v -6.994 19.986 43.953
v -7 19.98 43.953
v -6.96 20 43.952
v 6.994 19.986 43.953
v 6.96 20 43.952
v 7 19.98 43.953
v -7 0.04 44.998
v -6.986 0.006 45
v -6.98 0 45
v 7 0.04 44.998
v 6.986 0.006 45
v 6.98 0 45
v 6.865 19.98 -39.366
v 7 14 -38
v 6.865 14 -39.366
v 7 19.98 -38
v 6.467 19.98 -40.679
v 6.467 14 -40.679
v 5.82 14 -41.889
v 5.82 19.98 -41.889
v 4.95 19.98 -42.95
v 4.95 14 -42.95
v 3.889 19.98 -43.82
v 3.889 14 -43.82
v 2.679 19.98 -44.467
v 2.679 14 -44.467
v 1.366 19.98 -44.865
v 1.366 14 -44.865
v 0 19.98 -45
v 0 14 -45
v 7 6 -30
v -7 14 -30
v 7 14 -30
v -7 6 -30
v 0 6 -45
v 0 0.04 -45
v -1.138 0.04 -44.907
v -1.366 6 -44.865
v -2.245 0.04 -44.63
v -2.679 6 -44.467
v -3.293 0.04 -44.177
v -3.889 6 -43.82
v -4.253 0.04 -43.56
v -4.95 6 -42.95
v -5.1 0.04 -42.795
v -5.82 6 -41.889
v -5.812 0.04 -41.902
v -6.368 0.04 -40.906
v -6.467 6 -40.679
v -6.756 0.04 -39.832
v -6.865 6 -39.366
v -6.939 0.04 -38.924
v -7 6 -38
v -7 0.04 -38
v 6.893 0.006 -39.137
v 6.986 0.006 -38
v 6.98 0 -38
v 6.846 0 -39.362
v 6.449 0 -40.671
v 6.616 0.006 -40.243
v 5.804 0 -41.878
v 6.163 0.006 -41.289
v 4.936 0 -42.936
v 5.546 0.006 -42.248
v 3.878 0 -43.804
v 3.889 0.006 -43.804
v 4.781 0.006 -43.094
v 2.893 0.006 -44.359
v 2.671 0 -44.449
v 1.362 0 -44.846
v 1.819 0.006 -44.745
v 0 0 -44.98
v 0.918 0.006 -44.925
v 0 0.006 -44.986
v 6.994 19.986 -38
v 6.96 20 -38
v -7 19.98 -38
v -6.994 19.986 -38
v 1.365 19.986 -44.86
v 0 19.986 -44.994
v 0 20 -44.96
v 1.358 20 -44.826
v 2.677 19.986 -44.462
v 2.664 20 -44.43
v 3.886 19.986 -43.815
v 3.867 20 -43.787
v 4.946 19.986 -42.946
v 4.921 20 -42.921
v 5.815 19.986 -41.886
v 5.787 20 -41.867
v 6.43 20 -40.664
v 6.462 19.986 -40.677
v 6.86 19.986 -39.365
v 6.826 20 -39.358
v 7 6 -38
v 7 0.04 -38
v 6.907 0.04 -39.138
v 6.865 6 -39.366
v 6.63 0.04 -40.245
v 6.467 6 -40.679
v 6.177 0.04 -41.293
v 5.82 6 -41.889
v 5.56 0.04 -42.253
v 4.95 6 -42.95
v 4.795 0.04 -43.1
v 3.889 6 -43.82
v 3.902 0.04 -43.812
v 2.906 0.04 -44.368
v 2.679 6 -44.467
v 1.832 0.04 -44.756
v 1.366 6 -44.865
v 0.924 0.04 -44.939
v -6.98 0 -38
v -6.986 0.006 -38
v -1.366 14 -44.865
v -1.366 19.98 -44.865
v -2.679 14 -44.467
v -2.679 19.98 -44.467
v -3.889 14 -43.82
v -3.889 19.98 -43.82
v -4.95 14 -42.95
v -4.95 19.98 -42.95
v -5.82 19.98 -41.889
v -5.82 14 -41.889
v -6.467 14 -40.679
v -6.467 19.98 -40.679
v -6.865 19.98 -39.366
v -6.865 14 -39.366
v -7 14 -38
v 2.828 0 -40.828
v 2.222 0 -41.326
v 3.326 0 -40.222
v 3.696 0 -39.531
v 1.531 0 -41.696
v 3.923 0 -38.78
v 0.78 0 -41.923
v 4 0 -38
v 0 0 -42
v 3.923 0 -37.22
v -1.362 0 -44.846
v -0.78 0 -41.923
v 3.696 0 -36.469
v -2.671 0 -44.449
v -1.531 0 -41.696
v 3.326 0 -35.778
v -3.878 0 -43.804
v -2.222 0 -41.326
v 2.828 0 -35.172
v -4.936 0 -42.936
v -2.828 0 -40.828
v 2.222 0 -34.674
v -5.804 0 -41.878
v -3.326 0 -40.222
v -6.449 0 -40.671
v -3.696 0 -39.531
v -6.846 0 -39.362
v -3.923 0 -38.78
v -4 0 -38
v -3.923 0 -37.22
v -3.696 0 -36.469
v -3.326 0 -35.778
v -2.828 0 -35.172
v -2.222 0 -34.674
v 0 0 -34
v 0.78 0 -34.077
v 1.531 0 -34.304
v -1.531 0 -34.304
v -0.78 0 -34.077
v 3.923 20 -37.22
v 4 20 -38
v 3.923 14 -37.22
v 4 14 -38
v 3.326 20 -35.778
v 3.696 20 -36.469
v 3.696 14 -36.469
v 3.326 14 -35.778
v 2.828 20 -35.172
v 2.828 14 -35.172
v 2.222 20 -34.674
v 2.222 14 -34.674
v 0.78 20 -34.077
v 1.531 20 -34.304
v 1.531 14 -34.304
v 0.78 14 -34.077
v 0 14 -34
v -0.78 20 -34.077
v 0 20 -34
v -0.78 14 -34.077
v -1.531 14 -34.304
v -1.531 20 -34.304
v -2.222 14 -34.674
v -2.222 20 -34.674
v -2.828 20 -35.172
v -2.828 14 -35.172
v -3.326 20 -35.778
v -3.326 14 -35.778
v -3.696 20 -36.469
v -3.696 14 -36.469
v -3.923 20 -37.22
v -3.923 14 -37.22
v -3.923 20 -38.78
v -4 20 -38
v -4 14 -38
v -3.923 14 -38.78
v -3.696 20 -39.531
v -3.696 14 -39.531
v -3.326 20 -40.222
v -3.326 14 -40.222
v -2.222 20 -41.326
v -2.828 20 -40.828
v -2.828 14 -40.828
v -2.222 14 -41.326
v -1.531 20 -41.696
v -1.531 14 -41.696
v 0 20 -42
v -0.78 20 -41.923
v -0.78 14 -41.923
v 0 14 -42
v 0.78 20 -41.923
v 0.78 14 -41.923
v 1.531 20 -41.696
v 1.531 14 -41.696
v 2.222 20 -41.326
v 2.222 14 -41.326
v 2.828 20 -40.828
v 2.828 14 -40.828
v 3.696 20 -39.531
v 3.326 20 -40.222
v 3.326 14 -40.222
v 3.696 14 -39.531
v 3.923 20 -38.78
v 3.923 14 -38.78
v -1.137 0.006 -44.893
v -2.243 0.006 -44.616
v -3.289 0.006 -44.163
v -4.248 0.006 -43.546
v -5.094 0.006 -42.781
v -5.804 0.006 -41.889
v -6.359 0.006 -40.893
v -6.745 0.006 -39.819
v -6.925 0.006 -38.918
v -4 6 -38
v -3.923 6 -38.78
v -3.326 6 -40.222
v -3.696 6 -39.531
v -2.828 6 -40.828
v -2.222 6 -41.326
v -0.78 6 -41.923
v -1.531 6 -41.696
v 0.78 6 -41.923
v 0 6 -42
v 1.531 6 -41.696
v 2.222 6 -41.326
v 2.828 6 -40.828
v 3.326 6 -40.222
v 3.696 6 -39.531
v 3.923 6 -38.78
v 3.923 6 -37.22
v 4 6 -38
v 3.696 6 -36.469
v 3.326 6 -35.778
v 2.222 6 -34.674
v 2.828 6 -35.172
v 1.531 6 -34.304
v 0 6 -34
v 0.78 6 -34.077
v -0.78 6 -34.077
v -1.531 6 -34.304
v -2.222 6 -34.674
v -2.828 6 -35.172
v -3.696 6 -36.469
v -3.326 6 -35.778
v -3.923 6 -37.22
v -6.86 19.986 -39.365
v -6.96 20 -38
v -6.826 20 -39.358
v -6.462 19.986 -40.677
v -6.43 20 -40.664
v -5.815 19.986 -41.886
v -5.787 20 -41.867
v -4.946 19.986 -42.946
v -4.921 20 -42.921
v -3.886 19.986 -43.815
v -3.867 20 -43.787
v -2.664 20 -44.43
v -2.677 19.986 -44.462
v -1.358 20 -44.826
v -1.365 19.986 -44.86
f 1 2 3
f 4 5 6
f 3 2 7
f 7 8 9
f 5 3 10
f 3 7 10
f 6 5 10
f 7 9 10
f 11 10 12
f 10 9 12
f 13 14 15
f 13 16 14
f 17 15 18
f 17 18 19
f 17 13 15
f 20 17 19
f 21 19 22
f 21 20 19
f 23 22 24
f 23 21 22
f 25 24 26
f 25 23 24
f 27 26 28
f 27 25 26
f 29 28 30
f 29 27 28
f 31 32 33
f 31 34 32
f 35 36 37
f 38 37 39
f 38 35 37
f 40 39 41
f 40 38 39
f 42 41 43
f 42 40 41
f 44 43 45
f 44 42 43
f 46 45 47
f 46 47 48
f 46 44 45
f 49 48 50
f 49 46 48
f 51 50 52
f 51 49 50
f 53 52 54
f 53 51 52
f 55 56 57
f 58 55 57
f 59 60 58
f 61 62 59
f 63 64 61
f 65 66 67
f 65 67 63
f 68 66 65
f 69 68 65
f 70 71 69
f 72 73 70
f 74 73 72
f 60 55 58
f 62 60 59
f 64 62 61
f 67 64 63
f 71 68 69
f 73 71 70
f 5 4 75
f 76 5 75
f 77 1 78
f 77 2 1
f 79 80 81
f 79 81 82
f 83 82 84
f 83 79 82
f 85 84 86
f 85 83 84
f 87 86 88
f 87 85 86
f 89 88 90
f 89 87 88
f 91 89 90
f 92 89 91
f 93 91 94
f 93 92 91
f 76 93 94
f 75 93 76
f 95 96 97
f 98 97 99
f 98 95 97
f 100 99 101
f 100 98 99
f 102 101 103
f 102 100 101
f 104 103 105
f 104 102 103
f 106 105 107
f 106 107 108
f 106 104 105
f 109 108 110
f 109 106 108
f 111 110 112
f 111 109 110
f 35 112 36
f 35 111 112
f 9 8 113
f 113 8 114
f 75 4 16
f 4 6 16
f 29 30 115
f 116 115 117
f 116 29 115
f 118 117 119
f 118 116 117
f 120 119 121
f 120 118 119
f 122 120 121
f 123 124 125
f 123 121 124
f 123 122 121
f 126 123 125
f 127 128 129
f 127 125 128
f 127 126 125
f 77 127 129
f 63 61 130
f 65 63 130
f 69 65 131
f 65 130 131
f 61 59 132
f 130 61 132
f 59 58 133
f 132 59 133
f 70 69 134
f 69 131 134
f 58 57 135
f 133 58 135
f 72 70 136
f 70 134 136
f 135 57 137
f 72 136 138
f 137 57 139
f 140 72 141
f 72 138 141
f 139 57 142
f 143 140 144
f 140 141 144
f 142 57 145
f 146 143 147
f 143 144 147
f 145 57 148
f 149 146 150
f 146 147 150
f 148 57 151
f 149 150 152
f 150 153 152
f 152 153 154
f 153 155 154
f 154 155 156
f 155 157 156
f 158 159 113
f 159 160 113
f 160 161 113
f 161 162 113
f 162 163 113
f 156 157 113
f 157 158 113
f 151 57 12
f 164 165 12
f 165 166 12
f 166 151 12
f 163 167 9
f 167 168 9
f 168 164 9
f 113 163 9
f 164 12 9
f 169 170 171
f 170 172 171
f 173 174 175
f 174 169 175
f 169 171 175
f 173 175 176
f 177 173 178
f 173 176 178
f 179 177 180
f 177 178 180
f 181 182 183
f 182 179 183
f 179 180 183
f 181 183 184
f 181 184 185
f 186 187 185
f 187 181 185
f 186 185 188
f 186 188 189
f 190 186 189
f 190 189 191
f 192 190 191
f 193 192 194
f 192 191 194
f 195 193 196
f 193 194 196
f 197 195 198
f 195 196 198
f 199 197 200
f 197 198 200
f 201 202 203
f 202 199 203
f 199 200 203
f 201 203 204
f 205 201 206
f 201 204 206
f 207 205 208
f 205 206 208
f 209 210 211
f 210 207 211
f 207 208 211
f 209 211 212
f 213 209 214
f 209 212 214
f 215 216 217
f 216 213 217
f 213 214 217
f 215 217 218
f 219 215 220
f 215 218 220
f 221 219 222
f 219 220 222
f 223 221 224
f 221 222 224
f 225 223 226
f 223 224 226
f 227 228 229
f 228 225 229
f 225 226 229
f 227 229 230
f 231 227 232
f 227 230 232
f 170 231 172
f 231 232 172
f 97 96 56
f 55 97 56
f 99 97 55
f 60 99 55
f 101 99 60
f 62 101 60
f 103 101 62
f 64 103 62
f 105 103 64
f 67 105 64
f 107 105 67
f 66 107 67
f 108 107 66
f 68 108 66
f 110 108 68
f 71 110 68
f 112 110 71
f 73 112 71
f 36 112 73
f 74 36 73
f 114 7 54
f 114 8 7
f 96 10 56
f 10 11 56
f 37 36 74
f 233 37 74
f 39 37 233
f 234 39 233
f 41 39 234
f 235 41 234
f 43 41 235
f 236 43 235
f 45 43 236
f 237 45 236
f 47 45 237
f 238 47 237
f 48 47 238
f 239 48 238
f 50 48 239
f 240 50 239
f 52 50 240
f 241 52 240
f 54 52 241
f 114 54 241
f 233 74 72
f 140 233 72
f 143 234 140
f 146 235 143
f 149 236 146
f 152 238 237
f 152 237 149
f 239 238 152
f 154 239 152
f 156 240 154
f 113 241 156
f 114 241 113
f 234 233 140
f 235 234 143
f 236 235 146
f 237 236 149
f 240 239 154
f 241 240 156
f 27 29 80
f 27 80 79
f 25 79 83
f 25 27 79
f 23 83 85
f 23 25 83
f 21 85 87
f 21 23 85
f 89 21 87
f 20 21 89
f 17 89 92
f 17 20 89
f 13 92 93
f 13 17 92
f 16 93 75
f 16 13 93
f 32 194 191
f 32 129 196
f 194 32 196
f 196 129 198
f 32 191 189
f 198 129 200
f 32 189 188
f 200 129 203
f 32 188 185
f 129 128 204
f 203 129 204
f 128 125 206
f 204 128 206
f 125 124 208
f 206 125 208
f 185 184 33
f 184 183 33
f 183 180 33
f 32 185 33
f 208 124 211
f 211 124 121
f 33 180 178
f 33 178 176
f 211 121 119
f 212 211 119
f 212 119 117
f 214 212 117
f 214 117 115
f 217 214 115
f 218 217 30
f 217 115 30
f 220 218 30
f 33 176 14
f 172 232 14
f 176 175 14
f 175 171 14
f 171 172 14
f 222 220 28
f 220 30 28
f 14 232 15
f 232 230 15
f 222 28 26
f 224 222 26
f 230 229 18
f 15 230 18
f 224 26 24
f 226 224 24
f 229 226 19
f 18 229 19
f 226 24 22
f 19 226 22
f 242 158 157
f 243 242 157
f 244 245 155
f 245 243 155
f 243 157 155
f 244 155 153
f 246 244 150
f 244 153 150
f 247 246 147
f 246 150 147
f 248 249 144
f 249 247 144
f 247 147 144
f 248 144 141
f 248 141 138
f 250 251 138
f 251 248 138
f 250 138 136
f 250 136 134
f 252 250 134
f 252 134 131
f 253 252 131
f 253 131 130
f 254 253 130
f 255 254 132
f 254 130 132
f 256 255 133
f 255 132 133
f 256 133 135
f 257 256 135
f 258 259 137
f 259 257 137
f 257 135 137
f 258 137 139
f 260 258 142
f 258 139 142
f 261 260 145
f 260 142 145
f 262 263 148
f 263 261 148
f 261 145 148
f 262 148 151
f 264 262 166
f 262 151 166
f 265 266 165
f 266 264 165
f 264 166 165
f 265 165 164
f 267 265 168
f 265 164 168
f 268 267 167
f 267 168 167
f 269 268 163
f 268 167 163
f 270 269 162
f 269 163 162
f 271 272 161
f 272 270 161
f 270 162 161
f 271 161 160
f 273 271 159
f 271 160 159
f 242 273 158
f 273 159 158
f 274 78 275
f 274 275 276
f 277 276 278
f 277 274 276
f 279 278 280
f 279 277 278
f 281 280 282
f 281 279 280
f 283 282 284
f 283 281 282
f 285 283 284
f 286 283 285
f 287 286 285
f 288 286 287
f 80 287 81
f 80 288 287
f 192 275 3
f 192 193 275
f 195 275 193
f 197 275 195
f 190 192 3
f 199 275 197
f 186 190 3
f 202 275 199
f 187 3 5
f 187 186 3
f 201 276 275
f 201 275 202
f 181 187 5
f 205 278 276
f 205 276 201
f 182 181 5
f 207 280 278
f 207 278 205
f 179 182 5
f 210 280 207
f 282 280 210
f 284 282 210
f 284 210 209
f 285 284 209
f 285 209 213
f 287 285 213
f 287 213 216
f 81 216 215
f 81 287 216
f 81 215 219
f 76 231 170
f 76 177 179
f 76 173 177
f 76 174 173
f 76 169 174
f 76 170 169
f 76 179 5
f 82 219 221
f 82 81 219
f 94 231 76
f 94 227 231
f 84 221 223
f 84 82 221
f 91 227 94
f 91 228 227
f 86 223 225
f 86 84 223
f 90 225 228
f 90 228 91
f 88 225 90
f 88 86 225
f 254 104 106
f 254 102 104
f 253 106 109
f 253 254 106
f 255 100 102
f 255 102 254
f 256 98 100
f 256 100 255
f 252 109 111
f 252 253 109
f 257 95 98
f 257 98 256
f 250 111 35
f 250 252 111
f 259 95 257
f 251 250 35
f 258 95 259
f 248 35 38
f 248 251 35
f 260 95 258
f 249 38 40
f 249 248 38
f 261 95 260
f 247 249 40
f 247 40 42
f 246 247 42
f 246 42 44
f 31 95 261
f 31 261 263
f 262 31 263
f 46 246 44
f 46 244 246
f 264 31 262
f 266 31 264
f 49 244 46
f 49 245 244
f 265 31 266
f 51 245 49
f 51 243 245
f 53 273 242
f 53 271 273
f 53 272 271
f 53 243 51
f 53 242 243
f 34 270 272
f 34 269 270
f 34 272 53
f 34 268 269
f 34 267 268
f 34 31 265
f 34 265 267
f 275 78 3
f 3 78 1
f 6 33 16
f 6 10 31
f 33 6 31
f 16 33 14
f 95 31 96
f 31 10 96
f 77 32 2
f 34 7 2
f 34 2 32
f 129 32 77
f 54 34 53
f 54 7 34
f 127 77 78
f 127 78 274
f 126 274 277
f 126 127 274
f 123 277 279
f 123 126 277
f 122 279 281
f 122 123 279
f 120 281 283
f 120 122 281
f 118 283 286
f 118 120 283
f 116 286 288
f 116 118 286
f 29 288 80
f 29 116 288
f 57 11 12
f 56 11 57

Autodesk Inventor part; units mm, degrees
ref_plane "YZ Plane" through (0, 0, 0) normal (1, 0, 0) x (0, 1, 0)
ref_plane "XZ Plane" through (0, 0, 0) normal (0, 1, 0) x (-1, 0, 0)
ref_plane "XY Plane" through (0, 0, 0) normal (0, 0, 1) x (1, 0, 0)
sketch "Sketch1" plane through (0, 0, 0) normal (0, 1, 0) x (-1, 0, 0)
  line L0 (-7, 0) -> (-7, -45)
  line L1 (-7, 0) -> (-7, 45)
  line L2 (-7, 45) -> (7, 45)
  line L3 (7, 45) -> (7, -45)
  circle A0 centre (0, -38) radius 4
  line L4 (7, -45) -> (-7, -45)
  point P0 (0, 0)
  dimension "d4" = 45
  dimension "d5" = 45
  dimension "d6" = 14
  dimension "d7" = 90
  dimension "d8" = 8
  dimension "d9" = 7
extrude "Extrusion1" add sketch "Sketch1" along normal blind 6
fillet "Fillet1" radius 7 2 edges at (7, 3, -45) (-7, 3, -45)
sketch "Sketch2" plane through (0, 6, 0) normal (0, 1, 0) x (1, 0, 0)
  line L0 (-7, 38) -> (-7, -45) projected
  line L1 (-7, 30) -> (7, 30)
  line L2 (7, -45) -> (7, 38) projected
  arc A0 (7, 38) -> (-7, 38) centre (0, 38) ccw projected
  line L3 (-7, 30) -> (-7, -45)
  line L4 (-7, -45) -> (7, -45) projected
  line L5 (-7, -45) -> (7, -45)
  line L6 (7, -45) -> (7, 30)
  point P0 (0, 0)
  point P1 (0, 30)
  point P2 (0, 45)
  dimension "d13" = 15
extrude "Extrusion2" add sketch "Sketch2" along normal blind 8 contours L1 L2 L4 L0
sketch "Sketch3" plane through (0, 14, 0) normal (0, 1, 0) x (1, 0, 0)
  line L0 (-7, -45) -> (7, -45) projected
  line L1 (-7, -45) -> (-7, 45)
  line L2 (-7, 38) -> (-7, -45) projected
  line L3 (-7, 45) -> (7, 45)
  line L4 (7, -45) -> (7, 38) projected
  line L5 (7, 45) -> (7, -45)
  line L6 (7, -45) -> (-7, -45)
  circle A0 centre (0, 38) radius 4
  point P0 (0, 0)
  dimension "d16" = 90
  dimension "d17" = 8
  dimension "d18" = 7
extrude "Extrusion3" add sketch "Sketch3" along normal blind 6
fillet "Fillet2" radius 7 2 edges at (7, 17, -45) (-7, 17, -45)
draft "FaceDraft1" angle 3 pull direction (0, 1, 0) faces at (2.3333, 13.3333, 45) fixed edges at (0, 0, 45)
chamfer "Chamfer1" distance 0.02 angle 45 3 edges at (7, 20, 2.9759) (4.9498, 20, -42.9498) (-7, 20, 2.9759)
chamfer "Chamfer2" distance 0.02 angle 45 3 edges at (7, 0, 3.5) (4.9498, 0, -42.9498) (-7, 0, 3.4999)
chamfer "Chamfer3" distance 0.02 angle 45 3 edges at (6.98, 20, 2.9759) (4.9356, 20, -42.9356) (-6.98, 20, 2.9759)
chamfer "Chamfer4" distance 0.02 angle 45 3 edges at (-7, 0.02, 3.4994) (4.9498, 0.02, -42.9498) (7, 0.02, 3.4994)
properties part number "Schneidstempel"
